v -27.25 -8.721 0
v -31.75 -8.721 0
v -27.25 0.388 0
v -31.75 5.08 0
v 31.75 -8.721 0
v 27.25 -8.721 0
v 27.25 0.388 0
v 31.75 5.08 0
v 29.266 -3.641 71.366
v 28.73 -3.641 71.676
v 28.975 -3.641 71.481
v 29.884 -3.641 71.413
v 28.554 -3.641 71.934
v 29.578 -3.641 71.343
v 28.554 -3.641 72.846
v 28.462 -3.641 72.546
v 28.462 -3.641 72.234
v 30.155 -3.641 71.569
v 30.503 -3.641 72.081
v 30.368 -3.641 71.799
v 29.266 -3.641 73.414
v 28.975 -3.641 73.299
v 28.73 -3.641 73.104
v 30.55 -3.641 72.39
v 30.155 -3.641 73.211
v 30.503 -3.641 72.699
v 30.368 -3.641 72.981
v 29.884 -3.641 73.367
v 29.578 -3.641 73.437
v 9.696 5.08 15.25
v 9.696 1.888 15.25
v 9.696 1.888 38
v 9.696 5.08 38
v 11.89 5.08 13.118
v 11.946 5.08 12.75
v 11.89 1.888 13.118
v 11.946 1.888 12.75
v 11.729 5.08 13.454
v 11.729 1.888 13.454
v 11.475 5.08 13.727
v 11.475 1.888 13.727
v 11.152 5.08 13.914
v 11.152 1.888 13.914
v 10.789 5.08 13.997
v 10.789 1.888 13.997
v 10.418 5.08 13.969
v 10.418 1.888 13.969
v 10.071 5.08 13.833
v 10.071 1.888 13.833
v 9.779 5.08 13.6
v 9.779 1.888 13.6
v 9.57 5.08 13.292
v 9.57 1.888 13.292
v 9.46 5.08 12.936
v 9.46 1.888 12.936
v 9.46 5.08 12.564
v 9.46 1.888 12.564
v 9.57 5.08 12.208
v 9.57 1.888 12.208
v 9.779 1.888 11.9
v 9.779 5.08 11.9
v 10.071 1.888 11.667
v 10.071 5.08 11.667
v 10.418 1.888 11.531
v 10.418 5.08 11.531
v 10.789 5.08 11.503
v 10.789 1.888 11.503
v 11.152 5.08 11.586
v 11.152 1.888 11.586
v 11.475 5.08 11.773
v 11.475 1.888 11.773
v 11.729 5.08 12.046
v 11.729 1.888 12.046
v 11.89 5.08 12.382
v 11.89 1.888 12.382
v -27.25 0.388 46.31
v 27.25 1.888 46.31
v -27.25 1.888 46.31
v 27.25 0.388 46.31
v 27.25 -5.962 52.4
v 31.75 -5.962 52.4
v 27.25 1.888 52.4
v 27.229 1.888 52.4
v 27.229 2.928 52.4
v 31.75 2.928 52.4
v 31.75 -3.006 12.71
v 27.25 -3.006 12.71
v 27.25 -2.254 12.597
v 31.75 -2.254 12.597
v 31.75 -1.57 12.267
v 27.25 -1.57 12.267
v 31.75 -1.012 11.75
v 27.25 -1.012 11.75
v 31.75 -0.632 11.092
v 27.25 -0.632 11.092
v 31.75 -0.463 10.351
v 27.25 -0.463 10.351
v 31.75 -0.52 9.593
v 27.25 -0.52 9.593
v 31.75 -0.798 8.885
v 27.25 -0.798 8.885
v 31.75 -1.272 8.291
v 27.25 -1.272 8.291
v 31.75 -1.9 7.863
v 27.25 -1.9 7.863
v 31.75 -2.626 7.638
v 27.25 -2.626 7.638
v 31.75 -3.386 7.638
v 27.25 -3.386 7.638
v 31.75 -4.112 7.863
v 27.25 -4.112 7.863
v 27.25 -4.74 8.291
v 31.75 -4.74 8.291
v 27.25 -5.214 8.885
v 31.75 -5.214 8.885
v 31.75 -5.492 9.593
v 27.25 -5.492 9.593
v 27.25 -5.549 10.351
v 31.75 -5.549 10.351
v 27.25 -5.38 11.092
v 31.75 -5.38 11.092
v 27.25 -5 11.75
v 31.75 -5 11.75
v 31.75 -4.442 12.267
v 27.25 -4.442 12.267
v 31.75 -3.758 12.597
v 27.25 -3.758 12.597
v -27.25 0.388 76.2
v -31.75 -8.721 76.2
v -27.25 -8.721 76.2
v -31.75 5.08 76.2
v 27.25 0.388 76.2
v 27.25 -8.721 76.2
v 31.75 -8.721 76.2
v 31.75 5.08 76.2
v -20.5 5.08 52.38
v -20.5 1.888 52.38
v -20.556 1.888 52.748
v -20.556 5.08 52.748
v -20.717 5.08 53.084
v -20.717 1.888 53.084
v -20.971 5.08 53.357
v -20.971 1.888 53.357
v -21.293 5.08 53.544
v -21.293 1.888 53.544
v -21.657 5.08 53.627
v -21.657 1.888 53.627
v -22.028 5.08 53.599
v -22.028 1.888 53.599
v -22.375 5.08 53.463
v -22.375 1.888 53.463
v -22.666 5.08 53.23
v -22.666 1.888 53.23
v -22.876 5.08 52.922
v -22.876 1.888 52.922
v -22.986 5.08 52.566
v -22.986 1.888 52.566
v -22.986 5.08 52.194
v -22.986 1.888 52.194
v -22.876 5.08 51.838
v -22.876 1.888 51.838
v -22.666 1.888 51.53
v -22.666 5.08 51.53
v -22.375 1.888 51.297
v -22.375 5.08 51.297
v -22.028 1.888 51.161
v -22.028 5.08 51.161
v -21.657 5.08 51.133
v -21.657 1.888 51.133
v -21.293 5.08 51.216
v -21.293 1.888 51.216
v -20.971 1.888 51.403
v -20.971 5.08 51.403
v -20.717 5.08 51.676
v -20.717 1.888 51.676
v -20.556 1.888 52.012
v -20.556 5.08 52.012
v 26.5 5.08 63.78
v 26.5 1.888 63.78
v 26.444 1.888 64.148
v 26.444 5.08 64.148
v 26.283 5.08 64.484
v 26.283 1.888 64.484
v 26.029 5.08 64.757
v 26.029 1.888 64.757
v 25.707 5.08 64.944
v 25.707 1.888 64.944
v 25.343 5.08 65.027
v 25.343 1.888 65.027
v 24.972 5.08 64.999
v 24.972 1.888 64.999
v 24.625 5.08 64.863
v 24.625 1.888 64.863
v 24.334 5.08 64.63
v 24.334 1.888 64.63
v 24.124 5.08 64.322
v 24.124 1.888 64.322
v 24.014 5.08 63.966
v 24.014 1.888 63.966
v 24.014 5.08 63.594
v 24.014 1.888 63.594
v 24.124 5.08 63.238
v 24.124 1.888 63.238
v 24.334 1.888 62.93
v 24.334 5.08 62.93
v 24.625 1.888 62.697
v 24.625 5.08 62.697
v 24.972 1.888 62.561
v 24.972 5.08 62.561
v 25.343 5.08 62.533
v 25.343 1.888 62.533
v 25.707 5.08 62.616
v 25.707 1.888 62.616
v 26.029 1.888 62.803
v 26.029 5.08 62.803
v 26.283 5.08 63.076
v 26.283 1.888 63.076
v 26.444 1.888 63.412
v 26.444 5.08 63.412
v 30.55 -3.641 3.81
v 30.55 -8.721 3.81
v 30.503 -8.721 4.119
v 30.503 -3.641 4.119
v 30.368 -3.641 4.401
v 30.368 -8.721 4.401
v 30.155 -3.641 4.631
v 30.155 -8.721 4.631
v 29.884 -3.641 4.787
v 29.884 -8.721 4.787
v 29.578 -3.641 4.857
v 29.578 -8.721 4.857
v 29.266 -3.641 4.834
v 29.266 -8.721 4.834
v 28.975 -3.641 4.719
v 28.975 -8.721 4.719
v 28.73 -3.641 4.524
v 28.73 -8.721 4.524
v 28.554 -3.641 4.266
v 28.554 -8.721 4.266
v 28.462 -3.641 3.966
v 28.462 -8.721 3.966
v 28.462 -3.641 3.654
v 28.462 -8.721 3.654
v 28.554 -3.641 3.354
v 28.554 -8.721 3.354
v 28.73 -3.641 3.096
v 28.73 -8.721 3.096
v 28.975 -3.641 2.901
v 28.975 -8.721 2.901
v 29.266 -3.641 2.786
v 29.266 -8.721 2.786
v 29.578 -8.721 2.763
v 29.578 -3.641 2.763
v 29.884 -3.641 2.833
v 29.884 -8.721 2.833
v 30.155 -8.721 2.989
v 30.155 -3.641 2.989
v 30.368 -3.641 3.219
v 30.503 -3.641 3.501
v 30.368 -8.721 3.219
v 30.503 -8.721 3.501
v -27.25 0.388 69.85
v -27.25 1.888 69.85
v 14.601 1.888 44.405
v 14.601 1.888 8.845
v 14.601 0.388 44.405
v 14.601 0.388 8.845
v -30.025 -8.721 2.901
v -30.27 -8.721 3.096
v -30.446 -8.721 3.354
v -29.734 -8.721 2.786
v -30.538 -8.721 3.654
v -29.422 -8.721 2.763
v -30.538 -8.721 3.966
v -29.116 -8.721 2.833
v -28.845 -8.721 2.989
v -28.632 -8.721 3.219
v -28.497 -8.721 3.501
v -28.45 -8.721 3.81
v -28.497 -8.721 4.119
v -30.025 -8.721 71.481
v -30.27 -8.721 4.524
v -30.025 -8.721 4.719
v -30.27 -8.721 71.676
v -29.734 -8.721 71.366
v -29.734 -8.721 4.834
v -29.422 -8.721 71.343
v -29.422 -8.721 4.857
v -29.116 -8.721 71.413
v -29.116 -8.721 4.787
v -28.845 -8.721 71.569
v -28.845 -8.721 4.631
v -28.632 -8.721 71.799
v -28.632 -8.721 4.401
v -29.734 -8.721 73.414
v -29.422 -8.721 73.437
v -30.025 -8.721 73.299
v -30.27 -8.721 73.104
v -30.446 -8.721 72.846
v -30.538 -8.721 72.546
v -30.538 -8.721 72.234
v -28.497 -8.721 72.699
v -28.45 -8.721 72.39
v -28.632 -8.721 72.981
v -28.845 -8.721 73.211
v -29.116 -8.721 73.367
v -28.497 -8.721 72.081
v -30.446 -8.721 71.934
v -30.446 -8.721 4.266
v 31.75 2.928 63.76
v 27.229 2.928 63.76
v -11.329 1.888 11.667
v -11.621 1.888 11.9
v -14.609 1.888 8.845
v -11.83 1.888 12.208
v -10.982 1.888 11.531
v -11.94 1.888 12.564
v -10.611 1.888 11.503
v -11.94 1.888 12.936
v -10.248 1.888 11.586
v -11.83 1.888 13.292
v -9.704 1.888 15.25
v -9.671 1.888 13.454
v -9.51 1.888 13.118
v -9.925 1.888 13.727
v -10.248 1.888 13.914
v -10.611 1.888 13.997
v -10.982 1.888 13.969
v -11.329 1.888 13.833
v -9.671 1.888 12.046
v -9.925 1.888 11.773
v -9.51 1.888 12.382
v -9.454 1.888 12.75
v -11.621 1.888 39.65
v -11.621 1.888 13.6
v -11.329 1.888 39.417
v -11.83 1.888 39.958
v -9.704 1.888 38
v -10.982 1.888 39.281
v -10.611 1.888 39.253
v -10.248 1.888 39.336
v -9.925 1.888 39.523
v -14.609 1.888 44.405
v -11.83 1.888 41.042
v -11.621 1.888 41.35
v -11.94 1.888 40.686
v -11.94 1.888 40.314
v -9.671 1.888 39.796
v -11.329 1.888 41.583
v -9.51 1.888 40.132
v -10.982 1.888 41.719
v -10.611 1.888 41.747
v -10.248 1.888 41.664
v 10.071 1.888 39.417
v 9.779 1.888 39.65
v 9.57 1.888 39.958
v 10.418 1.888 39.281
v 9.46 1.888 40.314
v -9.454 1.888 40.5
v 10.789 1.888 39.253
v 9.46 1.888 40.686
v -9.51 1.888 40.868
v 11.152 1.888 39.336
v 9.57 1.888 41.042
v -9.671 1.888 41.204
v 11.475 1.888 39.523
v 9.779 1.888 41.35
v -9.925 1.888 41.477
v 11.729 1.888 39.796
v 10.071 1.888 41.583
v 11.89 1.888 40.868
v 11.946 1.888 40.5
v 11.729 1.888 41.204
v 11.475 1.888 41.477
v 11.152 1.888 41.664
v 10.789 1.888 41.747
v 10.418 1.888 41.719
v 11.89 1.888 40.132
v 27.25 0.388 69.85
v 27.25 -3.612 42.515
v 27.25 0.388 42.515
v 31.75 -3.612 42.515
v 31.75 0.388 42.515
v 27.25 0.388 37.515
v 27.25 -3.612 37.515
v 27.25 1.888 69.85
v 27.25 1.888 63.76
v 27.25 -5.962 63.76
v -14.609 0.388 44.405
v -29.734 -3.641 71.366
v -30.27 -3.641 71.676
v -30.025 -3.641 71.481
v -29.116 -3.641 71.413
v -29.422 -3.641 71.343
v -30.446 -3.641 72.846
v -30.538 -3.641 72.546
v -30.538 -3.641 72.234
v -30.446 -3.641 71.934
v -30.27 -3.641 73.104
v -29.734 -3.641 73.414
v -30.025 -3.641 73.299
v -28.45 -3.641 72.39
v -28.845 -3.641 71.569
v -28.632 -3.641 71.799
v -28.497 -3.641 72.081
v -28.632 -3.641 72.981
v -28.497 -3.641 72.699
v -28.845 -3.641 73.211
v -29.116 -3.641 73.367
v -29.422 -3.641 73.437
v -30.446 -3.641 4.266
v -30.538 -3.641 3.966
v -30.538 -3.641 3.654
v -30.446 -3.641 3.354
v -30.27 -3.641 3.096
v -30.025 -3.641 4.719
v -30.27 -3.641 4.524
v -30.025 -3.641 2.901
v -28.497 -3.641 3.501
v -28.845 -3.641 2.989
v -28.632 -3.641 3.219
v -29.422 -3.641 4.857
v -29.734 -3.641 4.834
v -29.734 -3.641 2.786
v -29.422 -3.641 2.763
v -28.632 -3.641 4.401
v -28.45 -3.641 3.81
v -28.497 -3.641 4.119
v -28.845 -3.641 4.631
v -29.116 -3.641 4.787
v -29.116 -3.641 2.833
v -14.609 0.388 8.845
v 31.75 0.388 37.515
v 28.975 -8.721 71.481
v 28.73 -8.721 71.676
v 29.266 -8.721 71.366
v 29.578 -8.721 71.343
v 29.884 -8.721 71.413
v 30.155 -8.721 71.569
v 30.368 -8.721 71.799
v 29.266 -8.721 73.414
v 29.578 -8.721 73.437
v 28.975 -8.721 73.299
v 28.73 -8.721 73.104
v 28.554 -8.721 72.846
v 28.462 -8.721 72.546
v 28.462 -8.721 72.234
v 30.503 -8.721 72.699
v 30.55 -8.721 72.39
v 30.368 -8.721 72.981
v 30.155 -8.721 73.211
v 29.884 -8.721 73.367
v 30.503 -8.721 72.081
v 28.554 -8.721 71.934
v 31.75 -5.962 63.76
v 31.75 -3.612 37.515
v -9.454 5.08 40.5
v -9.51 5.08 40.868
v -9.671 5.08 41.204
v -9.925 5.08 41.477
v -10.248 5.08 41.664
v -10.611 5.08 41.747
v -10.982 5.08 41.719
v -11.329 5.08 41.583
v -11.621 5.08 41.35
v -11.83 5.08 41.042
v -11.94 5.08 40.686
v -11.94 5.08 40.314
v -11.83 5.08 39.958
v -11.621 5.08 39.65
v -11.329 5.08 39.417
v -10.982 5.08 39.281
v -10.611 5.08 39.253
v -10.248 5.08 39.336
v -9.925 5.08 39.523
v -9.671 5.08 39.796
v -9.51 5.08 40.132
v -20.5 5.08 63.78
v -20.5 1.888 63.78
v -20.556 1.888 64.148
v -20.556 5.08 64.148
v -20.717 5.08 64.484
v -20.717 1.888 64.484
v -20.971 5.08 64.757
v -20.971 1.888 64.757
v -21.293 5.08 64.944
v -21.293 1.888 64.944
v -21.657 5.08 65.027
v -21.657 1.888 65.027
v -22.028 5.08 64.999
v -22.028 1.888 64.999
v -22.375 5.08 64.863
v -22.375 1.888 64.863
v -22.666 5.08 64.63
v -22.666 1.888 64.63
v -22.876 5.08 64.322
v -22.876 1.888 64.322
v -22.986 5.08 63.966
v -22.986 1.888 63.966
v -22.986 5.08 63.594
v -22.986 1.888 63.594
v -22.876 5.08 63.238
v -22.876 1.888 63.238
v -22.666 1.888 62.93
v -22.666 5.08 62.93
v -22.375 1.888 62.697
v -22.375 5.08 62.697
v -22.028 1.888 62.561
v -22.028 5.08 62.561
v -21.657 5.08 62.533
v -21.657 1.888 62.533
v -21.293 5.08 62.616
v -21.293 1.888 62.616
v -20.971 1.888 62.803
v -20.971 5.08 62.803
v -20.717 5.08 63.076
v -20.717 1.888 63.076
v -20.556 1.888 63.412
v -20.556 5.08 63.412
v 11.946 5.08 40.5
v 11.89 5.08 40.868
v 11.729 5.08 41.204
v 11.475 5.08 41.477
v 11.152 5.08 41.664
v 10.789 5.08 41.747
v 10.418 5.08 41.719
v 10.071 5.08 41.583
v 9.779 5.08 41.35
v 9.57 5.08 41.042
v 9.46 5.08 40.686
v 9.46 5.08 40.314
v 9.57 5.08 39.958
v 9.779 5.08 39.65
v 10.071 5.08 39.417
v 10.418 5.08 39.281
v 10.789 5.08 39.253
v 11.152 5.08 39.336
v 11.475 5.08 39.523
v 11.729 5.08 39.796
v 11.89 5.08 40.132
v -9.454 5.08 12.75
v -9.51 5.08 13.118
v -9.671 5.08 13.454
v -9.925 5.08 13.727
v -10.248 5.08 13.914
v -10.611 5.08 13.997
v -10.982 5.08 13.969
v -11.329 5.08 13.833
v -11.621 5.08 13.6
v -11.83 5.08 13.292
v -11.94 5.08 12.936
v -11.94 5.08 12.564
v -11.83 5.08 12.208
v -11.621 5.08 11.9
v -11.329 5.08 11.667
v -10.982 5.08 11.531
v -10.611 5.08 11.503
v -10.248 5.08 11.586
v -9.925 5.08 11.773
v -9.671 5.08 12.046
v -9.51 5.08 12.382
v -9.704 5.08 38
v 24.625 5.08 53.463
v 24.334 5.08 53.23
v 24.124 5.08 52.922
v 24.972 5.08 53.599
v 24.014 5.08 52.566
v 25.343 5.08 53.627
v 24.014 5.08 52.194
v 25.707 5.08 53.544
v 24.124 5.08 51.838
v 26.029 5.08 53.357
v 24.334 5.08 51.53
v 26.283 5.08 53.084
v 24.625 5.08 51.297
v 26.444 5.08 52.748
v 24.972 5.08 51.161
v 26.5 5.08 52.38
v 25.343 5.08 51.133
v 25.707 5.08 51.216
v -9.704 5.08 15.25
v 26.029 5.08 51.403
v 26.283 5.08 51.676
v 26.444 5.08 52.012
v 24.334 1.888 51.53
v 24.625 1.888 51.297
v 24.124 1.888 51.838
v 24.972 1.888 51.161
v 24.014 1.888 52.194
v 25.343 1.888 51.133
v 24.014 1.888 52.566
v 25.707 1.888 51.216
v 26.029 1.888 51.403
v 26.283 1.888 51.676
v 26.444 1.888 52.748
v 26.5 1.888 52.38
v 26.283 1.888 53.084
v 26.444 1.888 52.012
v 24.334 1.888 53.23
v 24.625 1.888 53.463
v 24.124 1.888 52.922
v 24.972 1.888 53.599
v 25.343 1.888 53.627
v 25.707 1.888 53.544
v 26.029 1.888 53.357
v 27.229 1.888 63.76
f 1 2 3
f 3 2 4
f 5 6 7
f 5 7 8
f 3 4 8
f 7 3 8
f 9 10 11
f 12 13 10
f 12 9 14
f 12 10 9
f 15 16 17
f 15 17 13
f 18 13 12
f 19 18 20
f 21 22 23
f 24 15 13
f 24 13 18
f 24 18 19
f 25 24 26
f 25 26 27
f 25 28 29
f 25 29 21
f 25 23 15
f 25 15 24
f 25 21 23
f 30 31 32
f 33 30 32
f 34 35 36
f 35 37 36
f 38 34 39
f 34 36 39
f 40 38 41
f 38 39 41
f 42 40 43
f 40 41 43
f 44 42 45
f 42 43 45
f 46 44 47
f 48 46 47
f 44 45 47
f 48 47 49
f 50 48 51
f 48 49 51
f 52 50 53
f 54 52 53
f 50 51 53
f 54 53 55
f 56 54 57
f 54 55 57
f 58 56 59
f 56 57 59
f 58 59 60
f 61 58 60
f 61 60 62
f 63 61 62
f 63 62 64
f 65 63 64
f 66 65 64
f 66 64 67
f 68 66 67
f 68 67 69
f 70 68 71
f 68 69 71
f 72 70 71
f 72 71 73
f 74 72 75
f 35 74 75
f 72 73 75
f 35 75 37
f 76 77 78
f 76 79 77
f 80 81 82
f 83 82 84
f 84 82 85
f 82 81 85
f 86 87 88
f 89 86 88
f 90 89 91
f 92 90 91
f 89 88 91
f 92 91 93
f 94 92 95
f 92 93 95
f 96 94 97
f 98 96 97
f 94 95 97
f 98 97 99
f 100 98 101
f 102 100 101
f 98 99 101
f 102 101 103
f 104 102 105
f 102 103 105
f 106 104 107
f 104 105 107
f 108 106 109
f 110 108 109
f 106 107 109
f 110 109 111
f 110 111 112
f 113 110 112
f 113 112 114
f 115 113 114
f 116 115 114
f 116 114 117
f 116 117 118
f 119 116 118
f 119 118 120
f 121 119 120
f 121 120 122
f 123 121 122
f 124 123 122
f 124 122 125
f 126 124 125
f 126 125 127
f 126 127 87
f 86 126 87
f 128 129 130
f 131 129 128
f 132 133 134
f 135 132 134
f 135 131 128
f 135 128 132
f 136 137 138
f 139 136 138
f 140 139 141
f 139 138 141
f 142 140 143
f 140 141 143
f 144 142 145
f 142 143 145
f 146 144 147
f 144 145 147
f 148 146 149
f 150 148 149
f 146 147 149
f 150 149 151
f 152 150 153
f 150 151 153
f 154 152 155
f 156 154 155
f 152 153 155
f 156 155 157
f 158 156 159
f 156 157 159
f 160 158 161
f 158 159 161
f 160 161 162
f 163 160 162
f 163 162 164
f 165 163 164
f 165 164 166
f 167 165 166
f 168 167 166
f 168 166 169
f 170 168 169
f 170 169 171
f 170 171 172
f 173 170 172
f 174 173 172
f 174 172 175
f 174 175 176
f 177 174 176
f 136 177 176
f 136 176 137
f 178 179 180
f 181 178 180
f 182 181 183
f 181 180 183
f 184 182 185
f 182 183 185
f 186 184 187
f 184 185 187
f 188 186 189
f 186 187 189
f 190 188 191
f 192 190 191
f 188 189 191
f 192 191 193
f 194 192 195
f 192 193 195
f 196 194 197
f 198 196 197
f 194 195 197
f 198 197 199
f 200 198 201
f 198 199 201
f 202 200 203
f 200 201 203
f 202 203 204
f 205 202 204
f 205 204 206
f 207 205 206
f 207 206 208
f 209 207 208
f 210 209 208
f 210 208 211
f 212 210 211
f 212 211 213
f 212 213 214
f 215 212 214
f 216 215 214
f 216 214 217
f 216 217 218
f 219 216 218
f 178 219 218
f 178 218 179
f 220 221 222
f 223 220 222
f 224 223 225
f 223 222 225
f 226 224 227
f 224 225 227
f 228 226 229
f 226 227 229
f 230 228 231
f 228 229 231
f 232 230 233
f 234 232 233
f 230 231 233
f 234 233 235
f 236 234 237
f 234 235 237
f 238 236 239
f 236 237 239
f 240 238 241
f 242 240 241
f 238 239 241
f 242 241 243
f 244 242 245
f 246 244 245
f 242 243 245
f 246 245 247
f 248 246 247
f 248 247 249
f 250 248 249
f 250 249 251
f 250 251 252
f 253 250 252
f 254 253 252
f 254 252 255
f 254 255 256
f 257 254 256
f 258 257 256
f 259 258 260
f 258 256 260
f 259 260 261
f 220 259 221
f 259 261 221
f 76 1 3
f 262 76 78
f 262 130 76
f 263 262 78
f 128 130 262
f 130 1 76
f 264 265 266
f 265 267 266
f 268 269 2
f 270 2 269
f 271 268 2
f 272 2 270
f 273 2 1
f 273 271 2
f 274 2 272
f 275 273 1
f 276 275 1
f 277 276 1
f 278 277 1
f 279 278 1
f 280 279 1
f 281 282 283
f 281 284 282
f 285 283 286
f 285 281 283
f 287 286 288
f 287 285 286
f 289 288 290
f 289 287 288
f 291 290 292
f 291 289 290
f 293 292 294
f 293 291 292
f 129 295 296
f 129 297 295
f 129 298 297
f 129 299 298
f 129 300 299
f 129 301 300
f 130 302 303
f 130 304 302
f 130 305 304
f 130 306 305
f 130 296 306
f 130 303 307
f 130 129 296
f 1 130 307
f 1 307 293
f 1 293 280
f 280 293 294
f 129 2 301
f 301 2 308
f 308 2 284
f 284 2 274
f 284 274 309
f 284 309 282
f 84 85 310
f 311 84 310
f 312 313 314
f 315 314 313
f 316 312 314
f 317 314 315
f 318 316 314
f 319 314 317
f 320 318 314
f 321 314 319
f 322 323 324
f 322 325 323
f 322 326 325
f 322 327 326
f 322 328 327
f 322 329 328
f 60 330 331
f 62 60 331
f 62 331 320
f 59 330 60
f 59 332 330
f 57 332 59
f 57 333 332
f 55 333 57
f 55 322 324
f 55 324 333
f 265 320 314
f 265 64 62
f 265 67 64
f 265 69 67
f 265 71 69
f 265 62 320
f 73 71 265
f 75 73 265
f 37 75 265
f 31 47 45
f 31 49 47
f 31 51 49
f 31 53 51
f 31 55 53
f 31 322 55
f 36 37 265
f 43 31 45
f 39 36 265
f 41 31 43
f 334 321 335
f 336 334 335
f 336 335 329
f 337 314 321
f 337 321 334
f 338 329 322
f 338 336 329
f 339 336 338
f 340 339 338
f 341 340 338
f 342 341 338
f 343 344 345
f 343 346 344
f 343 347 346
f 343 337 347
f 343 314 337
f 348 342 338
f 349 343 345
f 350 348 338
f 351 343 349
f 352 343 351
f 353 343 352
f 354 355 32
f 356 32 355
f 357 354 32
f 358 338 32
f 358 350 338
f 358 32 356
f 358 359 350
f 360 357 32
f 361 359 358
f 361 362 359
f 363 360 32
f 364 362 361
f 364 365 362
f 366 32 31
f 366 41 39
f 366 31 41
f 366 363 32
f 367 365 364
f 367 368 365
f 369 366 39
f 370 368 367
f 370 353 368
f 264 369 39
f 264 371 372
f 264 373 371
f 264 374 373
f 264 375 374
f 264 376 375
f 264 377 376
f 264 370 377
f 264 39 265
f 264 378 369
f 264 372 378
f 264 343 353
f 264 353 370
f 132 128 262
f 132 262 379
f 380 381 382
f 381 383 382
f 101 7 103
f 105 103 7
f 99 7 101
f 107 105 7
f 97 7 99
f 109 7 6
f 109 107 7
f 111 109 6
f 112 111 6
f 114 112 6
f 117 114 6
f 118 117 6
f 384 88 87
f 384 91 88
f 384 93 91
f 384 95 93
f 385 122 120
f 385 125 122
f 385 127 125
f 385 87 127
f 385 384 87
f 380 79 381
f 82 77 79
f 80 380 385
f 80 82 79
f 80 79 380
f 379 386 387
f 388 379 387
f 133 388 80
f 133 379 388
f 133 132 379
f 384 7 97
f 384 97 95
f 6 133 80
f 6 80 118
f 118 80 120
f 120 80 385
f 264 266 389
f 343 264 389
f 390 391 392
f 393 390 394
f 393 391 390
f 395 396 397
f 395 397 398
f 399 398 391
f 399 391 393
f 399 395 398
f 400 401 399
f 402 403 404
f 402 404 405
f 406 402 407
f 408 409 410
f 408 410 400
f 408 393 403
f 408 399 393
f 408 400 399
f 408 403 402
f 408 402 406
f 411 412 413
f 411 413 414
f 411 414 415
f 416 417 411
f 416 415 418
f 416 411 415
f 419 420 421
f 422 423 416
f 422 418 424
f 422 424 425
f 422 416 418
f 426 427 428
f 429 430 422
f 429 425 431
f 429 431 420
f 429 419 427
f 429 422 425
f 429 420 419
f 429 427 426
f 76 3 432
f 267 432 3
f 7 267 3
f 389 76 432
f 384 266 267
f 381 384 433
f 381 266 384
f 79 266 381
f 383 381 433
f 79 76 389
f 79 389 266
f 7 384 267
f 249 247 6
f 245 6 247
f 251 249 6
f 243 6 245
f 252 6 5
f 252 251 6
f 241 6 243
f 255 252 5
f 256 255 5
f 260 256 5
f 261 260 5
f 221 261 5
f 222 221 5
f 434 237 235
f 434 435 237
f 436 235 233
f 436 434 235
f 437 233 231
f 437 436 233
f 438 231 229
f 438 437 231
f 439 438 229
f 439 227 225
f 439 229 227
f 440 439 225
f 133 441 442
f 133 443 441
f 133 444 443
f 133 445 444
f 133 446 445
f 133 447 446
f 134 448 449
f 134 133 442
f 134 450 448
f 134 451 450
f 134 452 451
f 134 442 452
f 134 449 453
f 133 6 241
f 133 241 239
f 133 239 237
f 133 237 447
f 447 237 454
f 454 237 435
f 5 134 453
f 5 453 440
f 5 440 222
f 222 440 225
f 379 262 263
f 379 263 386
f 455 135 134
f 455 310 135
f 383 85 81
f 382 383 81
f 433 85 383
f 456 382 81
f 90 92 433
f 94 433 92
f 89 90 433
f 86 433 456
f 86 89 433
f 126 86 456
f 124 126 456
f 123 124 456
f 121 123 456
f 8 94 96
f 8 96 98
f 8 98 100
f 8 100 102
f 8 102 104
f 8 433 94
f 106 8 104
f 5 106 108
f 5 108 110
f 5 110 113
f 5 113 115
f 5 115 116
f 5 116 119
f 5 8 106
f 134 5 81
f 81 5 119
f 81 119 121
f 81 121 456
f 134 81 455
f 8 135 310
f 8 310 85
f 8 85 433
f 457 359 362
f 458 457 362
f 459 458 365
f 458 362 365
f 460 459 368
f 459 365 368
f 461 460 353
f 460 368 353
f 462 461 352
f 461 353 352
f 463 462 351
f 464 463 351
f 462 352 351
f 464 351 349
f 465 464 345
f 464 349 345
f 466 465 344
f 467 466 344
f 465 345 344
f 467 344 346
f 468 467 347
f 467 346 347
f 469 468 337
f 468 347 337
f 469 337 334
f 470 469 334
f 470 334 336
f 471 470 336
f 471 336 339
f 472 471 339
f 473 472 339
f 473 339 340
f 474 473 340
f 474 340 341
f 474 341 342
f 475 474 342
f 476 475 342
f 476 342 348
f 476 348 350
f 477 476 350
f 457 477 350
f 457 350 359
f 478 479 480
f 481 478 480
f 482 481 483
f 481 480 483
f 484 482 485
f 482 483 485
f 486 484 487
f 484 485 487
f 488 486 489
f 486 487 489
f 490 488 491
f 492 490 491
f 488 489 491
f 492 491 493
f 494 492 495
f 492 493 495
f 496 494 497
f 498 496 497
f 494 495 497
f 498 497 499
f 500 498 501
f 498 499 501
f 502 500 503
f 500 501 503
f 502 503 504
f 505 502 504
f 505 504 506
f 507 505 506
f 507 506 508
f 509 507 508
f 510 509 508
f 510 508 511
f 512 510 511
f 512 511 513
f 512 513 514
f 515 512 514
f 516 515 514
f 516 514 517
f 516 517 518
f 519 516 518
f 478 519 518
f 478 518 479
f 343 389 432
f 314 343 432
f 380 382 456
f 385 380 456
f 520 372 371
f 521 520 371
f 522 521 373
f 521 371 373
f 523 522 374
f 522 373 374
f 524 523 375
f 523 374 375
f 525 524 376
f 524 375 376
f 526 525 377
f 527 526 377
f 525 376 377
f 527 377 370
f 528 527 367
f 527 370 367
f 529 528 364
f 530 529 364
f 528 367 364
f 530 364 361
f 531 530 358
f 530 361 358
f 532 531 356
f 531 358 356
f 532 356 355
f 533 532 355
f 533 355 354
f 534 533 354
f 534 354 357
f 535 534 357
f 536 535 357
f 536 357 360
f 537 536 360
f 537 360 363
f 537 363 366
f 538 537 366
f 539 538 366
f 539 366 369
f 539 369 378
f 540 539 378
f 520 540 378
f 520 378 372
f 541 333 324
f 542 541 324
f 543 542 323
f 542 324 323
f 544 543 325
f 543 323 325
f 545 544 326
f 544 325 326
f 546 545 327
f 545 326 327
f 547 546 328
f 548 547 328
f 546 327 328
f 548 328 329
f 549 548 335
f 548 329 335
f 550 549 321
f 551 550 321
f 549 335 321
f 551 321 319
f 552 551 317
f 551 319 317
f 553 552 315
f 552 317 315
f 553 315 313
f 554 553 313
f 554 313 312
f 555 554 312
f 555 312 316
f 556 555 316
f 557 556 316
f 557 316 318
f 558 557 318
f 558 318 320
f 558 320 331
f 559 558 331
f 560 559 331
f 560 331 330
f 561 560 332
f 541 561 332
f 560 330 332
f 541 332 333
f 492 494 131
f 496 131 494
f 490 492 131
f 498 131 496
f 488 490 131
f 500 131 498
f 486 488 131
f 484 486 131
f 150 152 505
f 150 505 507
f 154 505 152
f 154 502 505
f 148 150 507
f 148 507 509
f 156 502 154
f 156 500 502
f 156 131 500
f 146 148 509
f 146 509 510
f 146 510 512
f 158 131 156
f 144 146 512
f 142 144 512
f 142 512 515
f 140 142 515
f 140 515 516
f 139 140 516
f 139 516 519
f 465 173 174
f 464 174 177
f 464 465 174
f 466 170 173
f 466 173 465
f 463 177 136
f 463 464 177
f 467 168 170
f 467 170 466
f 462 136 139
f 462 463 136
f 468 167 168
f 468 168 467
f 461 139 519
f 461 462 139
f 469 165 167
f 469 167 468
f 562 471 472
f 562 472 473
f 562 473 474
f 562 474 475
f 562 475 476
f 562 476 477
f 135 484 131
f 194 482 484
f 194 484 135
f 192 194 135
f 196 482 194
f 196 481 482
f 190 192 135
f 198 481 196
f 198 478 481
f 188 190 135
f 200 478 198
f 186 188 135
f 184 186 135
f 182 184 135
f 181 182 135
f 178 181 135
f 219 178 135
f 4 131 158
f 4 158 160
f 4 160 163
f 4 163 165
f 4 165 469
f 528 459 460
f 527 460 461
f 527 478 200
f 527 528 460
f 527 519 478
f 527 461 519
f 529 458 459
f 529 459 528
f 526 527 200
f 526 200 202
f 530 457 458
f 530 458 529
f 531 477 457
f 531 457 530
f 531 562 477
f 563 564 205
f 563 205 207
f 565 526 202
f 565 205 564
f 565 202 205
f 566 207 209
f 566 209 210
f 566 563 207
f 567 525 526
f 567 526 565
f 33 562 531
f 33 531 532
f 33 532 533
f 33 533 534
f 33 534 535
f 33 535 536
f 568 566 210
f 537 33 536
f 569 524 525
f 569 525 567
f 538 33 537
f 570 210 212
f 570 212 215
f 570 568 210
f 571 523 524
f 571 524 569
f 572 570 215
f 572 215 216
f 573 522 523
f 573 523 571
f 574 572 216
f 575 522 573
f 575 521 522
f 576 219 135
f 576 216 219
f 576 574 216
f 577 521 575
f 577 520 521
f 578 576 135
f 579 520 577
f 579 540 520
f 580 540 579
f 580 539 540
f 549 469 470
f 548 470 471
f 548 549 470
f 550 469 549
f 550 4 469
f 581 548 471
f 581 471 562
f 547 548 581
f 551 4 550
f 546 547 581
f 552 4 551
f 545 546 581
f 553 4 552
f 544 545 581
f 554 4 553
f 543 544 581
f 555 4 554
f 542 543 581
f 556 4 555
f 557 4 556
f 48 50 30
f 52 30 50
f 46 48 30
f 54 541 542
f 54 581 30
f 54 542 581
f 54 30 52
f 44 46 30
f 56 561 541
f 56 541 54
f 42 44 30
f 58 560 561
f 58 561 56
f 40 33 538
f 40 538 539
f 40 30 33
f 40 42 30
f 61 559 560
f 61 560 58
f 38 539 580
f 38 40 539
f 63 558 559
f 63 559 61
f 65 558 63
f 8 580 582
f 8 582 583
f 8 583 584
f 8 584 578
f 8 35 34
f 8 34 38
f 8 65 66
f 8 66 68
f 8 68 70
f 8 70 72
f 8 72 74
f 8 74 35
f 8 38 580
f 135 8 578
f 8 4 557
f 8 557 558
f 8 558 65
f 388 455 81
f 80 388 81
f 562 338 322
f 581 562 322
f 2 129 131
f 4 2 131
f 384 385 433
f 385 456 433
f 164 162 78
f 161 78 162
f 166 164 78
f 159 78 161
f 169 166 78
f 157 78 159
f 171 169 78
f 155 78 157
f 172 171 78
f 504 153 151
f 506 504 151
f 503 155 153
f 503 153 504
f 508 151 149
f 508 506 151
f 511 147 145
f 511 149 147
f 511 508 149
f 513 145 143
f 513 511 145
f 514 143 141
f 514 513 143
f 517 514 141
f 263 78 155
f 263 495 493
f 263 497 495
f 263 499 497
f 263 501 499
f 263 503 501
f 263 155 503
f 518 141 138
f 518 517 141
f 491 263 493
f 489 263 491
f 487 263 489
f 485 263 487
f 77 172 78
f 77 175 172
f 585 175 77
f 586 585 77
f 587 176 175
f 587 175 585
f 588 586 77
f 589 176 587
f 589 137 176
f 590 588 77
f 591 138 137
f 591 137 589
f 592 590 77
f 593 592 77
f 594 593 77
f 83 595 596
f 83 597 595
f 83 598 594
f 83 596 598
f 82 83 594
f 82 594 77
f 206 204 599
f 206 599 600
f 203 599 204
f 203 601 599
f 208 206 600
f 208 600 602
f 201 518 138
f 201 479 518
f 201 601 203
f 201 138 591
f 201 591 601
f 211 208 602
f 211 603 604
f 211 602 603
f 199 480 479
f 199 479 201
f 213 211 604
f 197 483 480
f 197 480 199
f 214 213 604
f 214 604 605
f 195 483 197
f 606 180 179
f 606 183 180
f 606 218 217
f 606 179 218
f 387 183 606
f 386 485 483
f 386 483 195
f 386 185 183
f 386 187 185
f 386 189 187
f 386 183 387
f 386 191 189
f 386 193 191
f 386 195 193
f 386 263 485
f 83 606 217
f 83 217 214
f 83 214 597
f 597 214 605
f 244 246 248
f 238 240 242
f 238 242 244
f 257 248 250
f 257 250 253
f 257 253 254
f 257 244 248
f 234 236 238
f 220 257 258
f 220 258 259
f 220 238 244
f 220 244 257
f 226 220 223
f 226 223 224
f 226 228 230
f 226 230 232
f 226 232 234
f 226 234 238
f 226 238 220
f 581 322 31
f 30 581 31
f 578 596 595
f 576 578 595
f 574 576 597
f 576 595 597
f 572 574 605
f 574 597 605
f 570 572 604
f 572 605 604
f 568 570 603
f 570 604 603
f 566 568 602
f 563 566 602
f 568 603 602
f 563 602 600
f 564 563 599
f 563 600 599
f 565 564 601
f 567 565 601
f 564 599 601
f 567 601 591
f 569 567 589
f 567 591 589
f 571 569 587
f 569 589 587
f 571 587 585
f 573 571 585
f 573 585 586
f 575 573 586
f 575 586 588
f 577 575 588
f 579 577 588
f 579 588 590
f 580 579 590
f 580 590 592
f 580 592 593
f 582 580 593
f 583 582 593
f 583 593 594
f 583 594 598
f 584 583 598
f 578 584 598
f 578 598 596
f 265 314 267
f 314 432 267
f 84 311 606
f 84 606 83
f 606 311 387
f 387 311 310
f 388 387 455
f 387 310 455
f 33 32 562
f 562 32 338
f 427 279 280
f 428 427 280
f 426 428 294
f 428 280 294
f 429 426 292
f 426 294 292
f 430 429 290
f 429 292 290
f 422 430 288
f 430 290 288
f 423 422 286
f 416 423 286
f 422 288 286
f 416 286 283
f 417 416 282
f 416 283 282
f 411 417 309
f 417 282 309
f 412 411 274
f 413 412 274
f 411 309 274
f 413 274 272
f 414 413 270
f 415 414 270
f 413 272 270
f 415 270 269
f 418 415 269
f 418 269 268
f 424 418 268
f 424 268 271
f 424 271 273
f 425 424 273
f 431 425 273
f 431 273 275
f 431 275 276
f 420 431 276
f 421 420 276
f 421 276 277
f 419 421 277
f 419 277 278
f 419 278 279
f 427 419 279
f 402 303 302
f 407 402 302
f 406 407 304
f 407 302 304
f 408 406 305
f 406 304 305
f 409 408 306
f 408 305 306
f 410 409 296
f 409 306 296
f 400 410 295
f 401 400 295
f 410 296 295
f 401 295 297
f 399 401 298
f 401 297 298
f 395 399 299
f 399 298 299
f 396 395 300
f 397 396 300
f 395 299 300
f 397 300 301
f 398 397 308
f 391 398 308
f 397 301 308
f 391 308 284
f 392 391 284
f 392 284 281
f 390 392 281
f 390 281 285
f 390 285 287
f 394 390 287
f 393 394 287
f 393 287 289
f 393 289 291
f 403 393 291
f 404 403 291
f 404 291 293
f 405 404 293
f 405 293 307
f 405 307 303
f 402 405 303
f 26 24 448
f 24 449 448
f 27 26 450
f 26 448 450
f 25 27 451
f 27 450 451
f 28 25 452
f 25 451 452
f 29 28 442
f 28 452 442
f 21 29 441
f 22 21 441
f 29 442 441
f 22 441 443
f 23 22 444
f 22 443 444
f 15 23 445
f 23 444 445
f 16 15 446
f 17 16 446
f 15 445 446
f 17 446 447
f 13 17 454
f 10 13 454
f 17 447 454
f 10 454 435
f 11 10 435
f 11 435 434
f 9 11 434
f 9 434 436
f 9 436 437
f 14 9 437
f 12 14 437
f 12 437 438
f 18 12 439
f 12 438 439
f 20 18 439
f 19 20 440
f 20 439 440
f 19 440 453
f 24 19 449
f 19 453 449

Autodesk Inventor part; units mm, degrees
ref_plane "YZ Plane" through (0, 0, 0) normal (1, 0, 0) x (0, 1, 0)
ref_plane "XZ Plane" through (0, 0, 0) normal (0, 1, 0) x (-1, 0, 0)
ref_plane "XY Plane" through (0, 0, 0) normal (0, 0, 1) x (1, 0, 0)
sketch "Sketch1" plane through (0, 0, 0) normal (0, 0, 1) x (1, 0, 0)
  line L0 (-31.75, 5.08) -> (31.75, 5.08)
  line L1 (31.75, 5.08) -> (31.75, -5.08)
  line L2 (31.75, -5.08) -> (-31.75, -5.08)
  line L3 (-31.75, -5.08) -> (-31.75, 5.08)
  point P0 (0, 0)
  dimension "d0" = 63.5
  dimension "d3" = 31.75
  dimension "d4" = 10.16
  dimension "d17" = 5.08
extrude "Extrusion1" add sketch "Sketch1" along normal blind 76.2
sketch "Sketch3" plane through (0, 0, 76.2) normal (0, 0, 1) x (1, 0, 0)
  line L0 (-27.25, 0.3875) -> (27.25, 0.3875)
  line L1 (27.25, 0.3875) -> (27.25, -0.3745)
  line L2 (27.25, -0.3745) -> (-27.25, -0.3745)
  line L3 (-27.25, -0.3745) -> (-27.25, 0.3875)
  line L4 (-31.75, 5.08) -> (-31.75, -5.08) projected
  point P0 (0, 0)
  point P1 (-27.25, 0.0065)
  dimension "d6" = 0.762
  dimension "d7" = 54.5
  dimension "d8" = 4.5
extrude "Extrusion2" cut sketch "Sketch3" against normal blind 85.1
sketch "Sketch8" plane through (0, 0, 76.2) normal (0, 0, 1) x (1, 0, 0)
  line L0 (-31.75, -5.08) -> (31.75, -5.08) projected
  line L1 (31.75, -5.08) -> (31.75, 5.08) projected
  line L2 (-31.75, -5.08) -> (31.75, -5.08)
  line L3 (31.75, -5.08) -> (31.75, 0.3875)
  line L4 (31.75, 0.3875) -> (-31.75, 0.3875)
  line L5 (27.25, 0.3875) -> (27.25, -0.3745) projected
  line L6 (27.25, -0.3745) -> (-27.25, -0.3745) projected
  line L7 (-27.25, -0.3745) -> (-27.25, 0.3875) projected
  line L8 (-27.25, 0.3875) -> (27.25, 0.3875) projected
  line L9 (-31.75, -5.08) -> (31.75, -5.08) projected
  line L10 (31.75, -5.08) -> (31.75, 5.08) projected
  line L11 (31.75, 5.08) -> (-31.75, 5.08) projected
  line L12 (-31.75, 5.08) -> (-31.75, -5.08) projected
  line L13 (-27.25, 0.3875) -> (-27.25, -0.3745) projected
  line L14 (-27.25, 0.3875) -> (27.25, 0.3875)
  line L15 (27.25, 0.3875) -> (27.25, -5.08)
  line L16 (27.25, -5.08) -> (-27.25, -5.08)
  line L17 (-27.25, -5.08) -> (-27.25, 0.3875)
  point P0 (0, 0)
  dimension "d30" = 0
sketch "Sketch9" plane through (-31.75, 5.08, 0) normal (0, 1, 0) x (1, 0, 0)
  line L0 (28.35, -18.7333) -> (35.15, -18.7333)
  line L1 (35.15, -18.7333) -> (35.15, -39.7333)
  line L2 (35.15, -39.7333) -> (28.35, -39.7333)
  line L3 (28.35, -39.7333) -> (28.35, -18.7333)
  line L4 (0, 0) -> (0, -76.2) projected
  line L5 (63.5, 0) -> (0, 0) projected
  point P0 (31.75, 0)
  point P1 (0, -38.1)
  dimension "d31" = 21
  dimension "d32" = 6.8
  dimension "d33" = 28.35
  dimension "d34" = 18.7333
extrude "Extrusion6" cut sketch "Sketch8" against normal blind 76.2 contours L17 L6 L15 L0
sketch "Sketch11" plane through (0, 0, 76.2) normal (0, 0, 1) x (1, 0, 0)
  point P0 (0, 0)
sketch "Sketch12" plane through (-31.75, -5.08, 0) normal (0, -1, 0) x (1, 0, 0)
  line L0 (4.5, 0) -> (4.5, 76.2) projected
  line L1 (0, 76.2) -> (4.5, 76.2) projected
  line L2 (0, 0) -> (0, 76.2) projected
  line L3 (0, 0) -> (4.5, 0) projected
  line L4 (59, 76.2) -> (59, 0) projected
  line L5 (59, 0) -> (63.5, 0) projected
  line L6 (63.5, 0) -> (63.5, 76.2) projected
  line L7 (59, 76.2) -> (63.5, 76.2) projected
  point P0 (31.75, 0)
extrude "Extrusion7" add sketch "Sketch12" along normal blind 3.641
sketch "Sketch14" plane through (27.25, 0.3875, 0) normal (-1, 0, 0) x (0, 0, 1)
  circle A0 centre (10.16, -3.3935) radius 2.55
  line L0 (76.2, 0) -> (0, 0) projected
  line L1 (76.2, -9.1085) -> (0, -9.1085) projected
  line L2 (0, -9.1085) -> (0, 0) projected
  point P0 (0, -0.3875)
  dimension "d41" = 5.1
  dimension "d43" = 5.715
  dimension "d44" = 10.16
extrude "Extrusion9" cut sketch "Sketch14" against normal blind 25.4
sketch "Sketch17" plane through (-31.75, -8.721, 0) normal (0, -1, 0) x (1, 0, 0)
  circle A0 centre (61.25, 3.81) radius 1.05
  line L0 (59, 0) -> (63.5, 0) projected
  line L1 (59, 76.2) -> (59, 0) projected
  circle A1 centre (2.25, 3.81) radius 1.05
  line L2 (0, 76.2) -> (0, 0) projected
  line L3 (0, 0) -> (4.5, 0) projected
  circle A2 centre (2.25, 72.39) radius 1.05
  circle A3 centre (61.25, 72.39) radius 1.05
  line L4 (4.5, 76.2) -> (0, 76.2) projected
  line L5 (63.5, 76.2) -> (59, 76.2) projected
  point P0 (31.75, 0)
  dimension "d98" = 2.1
  dimension "d99" = 3.81
  dimension "d100" = 2.25
  dimension "d101" = 2.25
  dimension "d102" = 2.1
  dimension "d103" = 3.81
  dimension "d104" = 2.1
  dimension "d105" = 2.1
  dimension "d106" = 3.81
  dimension "d107" = 3.81
  dimension "d108" = 2.25
extrude "Extrusion11" cut sketch "Sketch17" against normal blind 5.08
sketch "Sketch18" plane through (-27.25, 0.3875, 76.2) normal (0, -1, 0) x (1, 0, 0)
  circle A0 centre (5.5, -23.82) radius 1.25
  circle A1 centre (5.5, -12.42) radius 1.05
  circle A2 centre (5.5, -12.42) radius 1.25
  line L0 (3.5, -28.62) -> (3.5, -7.62)
  circle A3 centre (5.5, -23.82) radius 1.05
  line L1 (54.5, -28.62) -> (3.5, -28.62)
  line L2 (3.5, -7.62) -> (54.5, -7.62)
  circle A4 centre (52.5, -12.42) radius 1.05
  circle A5 centre (52.5, -12.42) radius 1.25
  line L3 (54.5, -7.62) -> (54.5, -28.62)
  circle A6 centre (52.5, -23.82) radius 1.05
  circle A7 centre (52.5, -23.82) radius 1.25
  line L4 (0, 0) -> (54.5, 0) projected
  line L5 (54.5, 0) -> (54.5, -76.2) projected
  point P0 (27.25, -76.2)
  dimension "d111" = 21
  dimension "d112" = 51
  dimension "d113" = 2.1
  dimension "d114" = 2.1
  dimension "d115" = 2.1
  dimension "d116" = 2.1
  dimension "d117" = 2
  dimension "d118" = 2
  dimension "d119" = 2
  dimension "d120" = 2
  dimension "d121" = 11.4
  dimension "d122" = 4.8
  dimension "d123" = 11.4
  dimension "d124" = 4.8
  dimension "d125" = 0.2
  dimension "d126" = 0.2
  dimension "d127" = 0.2
  dimension "d128" = 0.2
  dimension "d131" = 7.62
  dimension "d132" = 0
extrude "Extrusion12" cut sketch "Sketch18" against normal blind 25.4 contours A0 | A1 | A2 | A3 | A4 | A5 | A6 | A7
sketch "Sketch21" plane through (-31.75, -8.721, 0) normal (0, -1, 0) x (1, 0, 0)
  line L0 (59, 76.2) -> (59, 0) projected
  line L1 (59, 69.5452) -> (61.2521, 69.5452)
  line L2 (61.2521, 69.5452) -> (61.2521, 46.6852)
  line L3 (61.2521, 46.6852) -> (59, 46.6852)
  line L4 (59, 46.6852) -> (59, 69.5452)
  line L5 (63.5, 0) -> (63.5, 76.2) projected
  line L6 (63.5, 76.2) -> (59, 76.2) projected
  point P0 (31.75, 0)
  dimension "d147" = 4.5
  dimension "d148" = 2.2479
  dimension "d149" = 6.6548
  dimension "d150" = 22.86
sketch "Sketch22" plane through (31.75, 5.08, 76.2) normal (1, 0, 0) x (0, 0, -1)
  line L0 (13.67, -4.6925) -> (13.67, 0) projected
  line L1 (13.67, -4.6925) -> (13.67, 0) projected
  line L2 (25.07, -4.6925) -> (25.07, 0) projected
  line L3 (22.57, -4.6925) -> (22.57, 0) projected
  line L4 (11.17, -4.6925) -> (11.17, 0) projected
  line L5 (23.8, -2.1525) -> (12.44, -2.1525)
  line L6 (12.44, -2.1525) -> (12.44, -11.0425)
  line L7 (12.44, -11.0425) -> (23.8, -11.0425)
  line L8 (23.8, -11.0425) -> (23.8, -2.1525)
  point P0 (76.2, -5.08)
  point P1 (24.97, -4.6925)
  point P2 (24.97, -2.1525)
  point P3 (11.27, -2.6605)
  point P4 (11.27, -4.6925)
  dimension "d152" = 8.89
  dimension "d153" = 2.54
  dimension "d169" = 1.27
  dimension "d170" = 1.27
extrude "Extrusion15" cut sketch "Sketch22" against normal blind 4.5212
sketch "Sketch24" plane through (31.75, 5.08, 76.2) normal (1, 0, 0) x (0, 0, -1)
  line L0 (38.6849, -4.6925) -> (33.6849, -4.6925)
  line L1 (33.6849, -4.6925) -> (33.6849, -8.6925)
  line L2 (33.6849, -8.6925) -> (38.6849, -8.6925)
  line L3 (38.6849, -8.6925) -> (38.6849, -4.6925)
  line L4 (0, -4.6925) -> (76.2, -4.6925) projected
  point P0 (76.2, -5.08)
  point P1 (23.8, -4.6925)
  dimension "d163" = 5
  dimension "d164" = 4
  dimension "d165" = 0
extrude "Extrusion16" cut sketch "Sketch24" against normal blind 9.1211
sketch "Sketch27" plane through (-27.25, 0.3875, 76.2) normal (0, -1, 0) x (1, 0, 0)
  line L0 (54.5, 0) -> (54.5, -76.2) projected
  line L1 (0, 0) -> (0, -76.2) projected
  line L2 (54.5, -29.89) -> (0, -29.89)
  line L3 (0, -29.89) -> (0, -6.35)
  line L4 (0, -6.35) -> (54.5, -6.35)
  line L5 (54.5, -6.35) -> (54.5, -29.89)
  line L6 (54.5, -28.62) -> (3.5, -28.62) projected
  line L7 (3.5, -7.62) -> (54.5, -7.62) projected
  point P0 (27.25, -76.2)
  point P1 (54.5, -6.35)
  point P2 (0, -29.89)
  dimension "d171" = 1.27
  dimension "d172" = 1.27
extrude "Extrusion17" cut sketch "Sketch27" against normal blind 1.5
sketch "Sketch30" plane through (-27.25, 0.3875, 0) normal (0, -1, 0) x (1, 0, 0)
  line L0 (39.9458, 42.5) -> (14.5458, 42.5)
  line L1 (14.5458, 42.5) -> (14.5458, 10.75)
  line L2 (14.5458, 10.75) -> (39.9458, 10.75)
  line L3 (39.9458, 10.75) -> (39.9458, 42.5)
  line L4 (23.85, 39.7333) -> (30.65, 39.7333) projected
  line L5 (54.5, 0) -> (0, 0) projected
  line L6 (54.5, 76.2) -> (54.5, 0) projected
  line L7 (0, 0) -> (0, 76.2) projected
  line L8 (36.9458, 38) -> (17.5458, 38)
  line L9 (17.5458, 38) -> (17.5458, 15.25)
  line L10 (17.5458, 15.25) -> (36.9458, 15.25)
  line L11 (36.9458, 15.25) -> (36.9458, 38)
  circle A0 centre (37.9458, 40.5) radius 1.25
  line L12 (54.5, 46.31) -> (0, 46.31) projected
  circle A1 centre (37.9458, 12.75) radius 1.25
  circle A2 centre (16.5458, 12.75) radius 1.25
  circle A3 centre (16.5458, 40.5) radius 1.25
  line L13 (54.5, 46.31) -> (0, 46.31) projected
  line L14 (0, 46.31) -> (0, 0) projected
  line L15 (54.5, 0) -> (0, 0) projected
  line L16 (54.5, 37.5151) -> (54.5, 0) projected
  line L17 (59, 37.5151) -> (54.5, 37.5151) projected
  line L18 (59, 42.5151) -> (59, 37.5151) projected
  line L19 (59, 42.5151) -> (54.5, 42.5151) projected
  line L20 (54.5, 46.31) -> (54.5, 42.5151) projected
  line L21 (41.8508, 44.405) -> (12.6408, 44.405)
  line L22 (12.6408, 44.405) -> (12.6408, 8.845)
  line L23 (12.6408, 8.845) -> (41.8508, 8.845)
  line L24 (41.8508, 8.845) -> (41.8508, 44.405)
  point P0 (27.25, 0)
  dimension "d177" = 31.75
  dimension "d178" = 25.4
  dimension "d179" = 54.5
  dimension "d180" = 14.5542
  dimension "d181" = 4.5
  dimension "d182" = 3.81
  dimension "d183" = 3
  dimension "d184" = 4.5
  dimension "d185" = 3
  dimension "d186" = 2.5
  dimension "d187" = 2
  dimension "d188" = 2
  dimension "d189" = 2.5
  dimension "d190" = 2.5
  dimension "d191" = 2.5
  dimension "d193" = 2
  dimension "d195" = 2
  dimension "d196" = 2
  dimension "d197" = 2
  dimension "d204" = 1.905
  dimension "d210" = 2
  dimension "d211" = 2
extrude "Extrusion18" cut sketch "Sketch30" against normal blind 25.4 contours L11 L10 L9 L8
extrude "Extrusion19" cut sketch "Sketch30" against normal blind 1.5 contours L3 L2 L1 L0 | L11 L10 L9 L8 | A0 | A1 | A2 | A3 | L24 L23 L22 L21
extrude "Extrusion20" cut sketch "Sketch30" against normal blind 254 contours A0 | A1 | A2 | A3
properties part number "Scanner_Test_Top"
